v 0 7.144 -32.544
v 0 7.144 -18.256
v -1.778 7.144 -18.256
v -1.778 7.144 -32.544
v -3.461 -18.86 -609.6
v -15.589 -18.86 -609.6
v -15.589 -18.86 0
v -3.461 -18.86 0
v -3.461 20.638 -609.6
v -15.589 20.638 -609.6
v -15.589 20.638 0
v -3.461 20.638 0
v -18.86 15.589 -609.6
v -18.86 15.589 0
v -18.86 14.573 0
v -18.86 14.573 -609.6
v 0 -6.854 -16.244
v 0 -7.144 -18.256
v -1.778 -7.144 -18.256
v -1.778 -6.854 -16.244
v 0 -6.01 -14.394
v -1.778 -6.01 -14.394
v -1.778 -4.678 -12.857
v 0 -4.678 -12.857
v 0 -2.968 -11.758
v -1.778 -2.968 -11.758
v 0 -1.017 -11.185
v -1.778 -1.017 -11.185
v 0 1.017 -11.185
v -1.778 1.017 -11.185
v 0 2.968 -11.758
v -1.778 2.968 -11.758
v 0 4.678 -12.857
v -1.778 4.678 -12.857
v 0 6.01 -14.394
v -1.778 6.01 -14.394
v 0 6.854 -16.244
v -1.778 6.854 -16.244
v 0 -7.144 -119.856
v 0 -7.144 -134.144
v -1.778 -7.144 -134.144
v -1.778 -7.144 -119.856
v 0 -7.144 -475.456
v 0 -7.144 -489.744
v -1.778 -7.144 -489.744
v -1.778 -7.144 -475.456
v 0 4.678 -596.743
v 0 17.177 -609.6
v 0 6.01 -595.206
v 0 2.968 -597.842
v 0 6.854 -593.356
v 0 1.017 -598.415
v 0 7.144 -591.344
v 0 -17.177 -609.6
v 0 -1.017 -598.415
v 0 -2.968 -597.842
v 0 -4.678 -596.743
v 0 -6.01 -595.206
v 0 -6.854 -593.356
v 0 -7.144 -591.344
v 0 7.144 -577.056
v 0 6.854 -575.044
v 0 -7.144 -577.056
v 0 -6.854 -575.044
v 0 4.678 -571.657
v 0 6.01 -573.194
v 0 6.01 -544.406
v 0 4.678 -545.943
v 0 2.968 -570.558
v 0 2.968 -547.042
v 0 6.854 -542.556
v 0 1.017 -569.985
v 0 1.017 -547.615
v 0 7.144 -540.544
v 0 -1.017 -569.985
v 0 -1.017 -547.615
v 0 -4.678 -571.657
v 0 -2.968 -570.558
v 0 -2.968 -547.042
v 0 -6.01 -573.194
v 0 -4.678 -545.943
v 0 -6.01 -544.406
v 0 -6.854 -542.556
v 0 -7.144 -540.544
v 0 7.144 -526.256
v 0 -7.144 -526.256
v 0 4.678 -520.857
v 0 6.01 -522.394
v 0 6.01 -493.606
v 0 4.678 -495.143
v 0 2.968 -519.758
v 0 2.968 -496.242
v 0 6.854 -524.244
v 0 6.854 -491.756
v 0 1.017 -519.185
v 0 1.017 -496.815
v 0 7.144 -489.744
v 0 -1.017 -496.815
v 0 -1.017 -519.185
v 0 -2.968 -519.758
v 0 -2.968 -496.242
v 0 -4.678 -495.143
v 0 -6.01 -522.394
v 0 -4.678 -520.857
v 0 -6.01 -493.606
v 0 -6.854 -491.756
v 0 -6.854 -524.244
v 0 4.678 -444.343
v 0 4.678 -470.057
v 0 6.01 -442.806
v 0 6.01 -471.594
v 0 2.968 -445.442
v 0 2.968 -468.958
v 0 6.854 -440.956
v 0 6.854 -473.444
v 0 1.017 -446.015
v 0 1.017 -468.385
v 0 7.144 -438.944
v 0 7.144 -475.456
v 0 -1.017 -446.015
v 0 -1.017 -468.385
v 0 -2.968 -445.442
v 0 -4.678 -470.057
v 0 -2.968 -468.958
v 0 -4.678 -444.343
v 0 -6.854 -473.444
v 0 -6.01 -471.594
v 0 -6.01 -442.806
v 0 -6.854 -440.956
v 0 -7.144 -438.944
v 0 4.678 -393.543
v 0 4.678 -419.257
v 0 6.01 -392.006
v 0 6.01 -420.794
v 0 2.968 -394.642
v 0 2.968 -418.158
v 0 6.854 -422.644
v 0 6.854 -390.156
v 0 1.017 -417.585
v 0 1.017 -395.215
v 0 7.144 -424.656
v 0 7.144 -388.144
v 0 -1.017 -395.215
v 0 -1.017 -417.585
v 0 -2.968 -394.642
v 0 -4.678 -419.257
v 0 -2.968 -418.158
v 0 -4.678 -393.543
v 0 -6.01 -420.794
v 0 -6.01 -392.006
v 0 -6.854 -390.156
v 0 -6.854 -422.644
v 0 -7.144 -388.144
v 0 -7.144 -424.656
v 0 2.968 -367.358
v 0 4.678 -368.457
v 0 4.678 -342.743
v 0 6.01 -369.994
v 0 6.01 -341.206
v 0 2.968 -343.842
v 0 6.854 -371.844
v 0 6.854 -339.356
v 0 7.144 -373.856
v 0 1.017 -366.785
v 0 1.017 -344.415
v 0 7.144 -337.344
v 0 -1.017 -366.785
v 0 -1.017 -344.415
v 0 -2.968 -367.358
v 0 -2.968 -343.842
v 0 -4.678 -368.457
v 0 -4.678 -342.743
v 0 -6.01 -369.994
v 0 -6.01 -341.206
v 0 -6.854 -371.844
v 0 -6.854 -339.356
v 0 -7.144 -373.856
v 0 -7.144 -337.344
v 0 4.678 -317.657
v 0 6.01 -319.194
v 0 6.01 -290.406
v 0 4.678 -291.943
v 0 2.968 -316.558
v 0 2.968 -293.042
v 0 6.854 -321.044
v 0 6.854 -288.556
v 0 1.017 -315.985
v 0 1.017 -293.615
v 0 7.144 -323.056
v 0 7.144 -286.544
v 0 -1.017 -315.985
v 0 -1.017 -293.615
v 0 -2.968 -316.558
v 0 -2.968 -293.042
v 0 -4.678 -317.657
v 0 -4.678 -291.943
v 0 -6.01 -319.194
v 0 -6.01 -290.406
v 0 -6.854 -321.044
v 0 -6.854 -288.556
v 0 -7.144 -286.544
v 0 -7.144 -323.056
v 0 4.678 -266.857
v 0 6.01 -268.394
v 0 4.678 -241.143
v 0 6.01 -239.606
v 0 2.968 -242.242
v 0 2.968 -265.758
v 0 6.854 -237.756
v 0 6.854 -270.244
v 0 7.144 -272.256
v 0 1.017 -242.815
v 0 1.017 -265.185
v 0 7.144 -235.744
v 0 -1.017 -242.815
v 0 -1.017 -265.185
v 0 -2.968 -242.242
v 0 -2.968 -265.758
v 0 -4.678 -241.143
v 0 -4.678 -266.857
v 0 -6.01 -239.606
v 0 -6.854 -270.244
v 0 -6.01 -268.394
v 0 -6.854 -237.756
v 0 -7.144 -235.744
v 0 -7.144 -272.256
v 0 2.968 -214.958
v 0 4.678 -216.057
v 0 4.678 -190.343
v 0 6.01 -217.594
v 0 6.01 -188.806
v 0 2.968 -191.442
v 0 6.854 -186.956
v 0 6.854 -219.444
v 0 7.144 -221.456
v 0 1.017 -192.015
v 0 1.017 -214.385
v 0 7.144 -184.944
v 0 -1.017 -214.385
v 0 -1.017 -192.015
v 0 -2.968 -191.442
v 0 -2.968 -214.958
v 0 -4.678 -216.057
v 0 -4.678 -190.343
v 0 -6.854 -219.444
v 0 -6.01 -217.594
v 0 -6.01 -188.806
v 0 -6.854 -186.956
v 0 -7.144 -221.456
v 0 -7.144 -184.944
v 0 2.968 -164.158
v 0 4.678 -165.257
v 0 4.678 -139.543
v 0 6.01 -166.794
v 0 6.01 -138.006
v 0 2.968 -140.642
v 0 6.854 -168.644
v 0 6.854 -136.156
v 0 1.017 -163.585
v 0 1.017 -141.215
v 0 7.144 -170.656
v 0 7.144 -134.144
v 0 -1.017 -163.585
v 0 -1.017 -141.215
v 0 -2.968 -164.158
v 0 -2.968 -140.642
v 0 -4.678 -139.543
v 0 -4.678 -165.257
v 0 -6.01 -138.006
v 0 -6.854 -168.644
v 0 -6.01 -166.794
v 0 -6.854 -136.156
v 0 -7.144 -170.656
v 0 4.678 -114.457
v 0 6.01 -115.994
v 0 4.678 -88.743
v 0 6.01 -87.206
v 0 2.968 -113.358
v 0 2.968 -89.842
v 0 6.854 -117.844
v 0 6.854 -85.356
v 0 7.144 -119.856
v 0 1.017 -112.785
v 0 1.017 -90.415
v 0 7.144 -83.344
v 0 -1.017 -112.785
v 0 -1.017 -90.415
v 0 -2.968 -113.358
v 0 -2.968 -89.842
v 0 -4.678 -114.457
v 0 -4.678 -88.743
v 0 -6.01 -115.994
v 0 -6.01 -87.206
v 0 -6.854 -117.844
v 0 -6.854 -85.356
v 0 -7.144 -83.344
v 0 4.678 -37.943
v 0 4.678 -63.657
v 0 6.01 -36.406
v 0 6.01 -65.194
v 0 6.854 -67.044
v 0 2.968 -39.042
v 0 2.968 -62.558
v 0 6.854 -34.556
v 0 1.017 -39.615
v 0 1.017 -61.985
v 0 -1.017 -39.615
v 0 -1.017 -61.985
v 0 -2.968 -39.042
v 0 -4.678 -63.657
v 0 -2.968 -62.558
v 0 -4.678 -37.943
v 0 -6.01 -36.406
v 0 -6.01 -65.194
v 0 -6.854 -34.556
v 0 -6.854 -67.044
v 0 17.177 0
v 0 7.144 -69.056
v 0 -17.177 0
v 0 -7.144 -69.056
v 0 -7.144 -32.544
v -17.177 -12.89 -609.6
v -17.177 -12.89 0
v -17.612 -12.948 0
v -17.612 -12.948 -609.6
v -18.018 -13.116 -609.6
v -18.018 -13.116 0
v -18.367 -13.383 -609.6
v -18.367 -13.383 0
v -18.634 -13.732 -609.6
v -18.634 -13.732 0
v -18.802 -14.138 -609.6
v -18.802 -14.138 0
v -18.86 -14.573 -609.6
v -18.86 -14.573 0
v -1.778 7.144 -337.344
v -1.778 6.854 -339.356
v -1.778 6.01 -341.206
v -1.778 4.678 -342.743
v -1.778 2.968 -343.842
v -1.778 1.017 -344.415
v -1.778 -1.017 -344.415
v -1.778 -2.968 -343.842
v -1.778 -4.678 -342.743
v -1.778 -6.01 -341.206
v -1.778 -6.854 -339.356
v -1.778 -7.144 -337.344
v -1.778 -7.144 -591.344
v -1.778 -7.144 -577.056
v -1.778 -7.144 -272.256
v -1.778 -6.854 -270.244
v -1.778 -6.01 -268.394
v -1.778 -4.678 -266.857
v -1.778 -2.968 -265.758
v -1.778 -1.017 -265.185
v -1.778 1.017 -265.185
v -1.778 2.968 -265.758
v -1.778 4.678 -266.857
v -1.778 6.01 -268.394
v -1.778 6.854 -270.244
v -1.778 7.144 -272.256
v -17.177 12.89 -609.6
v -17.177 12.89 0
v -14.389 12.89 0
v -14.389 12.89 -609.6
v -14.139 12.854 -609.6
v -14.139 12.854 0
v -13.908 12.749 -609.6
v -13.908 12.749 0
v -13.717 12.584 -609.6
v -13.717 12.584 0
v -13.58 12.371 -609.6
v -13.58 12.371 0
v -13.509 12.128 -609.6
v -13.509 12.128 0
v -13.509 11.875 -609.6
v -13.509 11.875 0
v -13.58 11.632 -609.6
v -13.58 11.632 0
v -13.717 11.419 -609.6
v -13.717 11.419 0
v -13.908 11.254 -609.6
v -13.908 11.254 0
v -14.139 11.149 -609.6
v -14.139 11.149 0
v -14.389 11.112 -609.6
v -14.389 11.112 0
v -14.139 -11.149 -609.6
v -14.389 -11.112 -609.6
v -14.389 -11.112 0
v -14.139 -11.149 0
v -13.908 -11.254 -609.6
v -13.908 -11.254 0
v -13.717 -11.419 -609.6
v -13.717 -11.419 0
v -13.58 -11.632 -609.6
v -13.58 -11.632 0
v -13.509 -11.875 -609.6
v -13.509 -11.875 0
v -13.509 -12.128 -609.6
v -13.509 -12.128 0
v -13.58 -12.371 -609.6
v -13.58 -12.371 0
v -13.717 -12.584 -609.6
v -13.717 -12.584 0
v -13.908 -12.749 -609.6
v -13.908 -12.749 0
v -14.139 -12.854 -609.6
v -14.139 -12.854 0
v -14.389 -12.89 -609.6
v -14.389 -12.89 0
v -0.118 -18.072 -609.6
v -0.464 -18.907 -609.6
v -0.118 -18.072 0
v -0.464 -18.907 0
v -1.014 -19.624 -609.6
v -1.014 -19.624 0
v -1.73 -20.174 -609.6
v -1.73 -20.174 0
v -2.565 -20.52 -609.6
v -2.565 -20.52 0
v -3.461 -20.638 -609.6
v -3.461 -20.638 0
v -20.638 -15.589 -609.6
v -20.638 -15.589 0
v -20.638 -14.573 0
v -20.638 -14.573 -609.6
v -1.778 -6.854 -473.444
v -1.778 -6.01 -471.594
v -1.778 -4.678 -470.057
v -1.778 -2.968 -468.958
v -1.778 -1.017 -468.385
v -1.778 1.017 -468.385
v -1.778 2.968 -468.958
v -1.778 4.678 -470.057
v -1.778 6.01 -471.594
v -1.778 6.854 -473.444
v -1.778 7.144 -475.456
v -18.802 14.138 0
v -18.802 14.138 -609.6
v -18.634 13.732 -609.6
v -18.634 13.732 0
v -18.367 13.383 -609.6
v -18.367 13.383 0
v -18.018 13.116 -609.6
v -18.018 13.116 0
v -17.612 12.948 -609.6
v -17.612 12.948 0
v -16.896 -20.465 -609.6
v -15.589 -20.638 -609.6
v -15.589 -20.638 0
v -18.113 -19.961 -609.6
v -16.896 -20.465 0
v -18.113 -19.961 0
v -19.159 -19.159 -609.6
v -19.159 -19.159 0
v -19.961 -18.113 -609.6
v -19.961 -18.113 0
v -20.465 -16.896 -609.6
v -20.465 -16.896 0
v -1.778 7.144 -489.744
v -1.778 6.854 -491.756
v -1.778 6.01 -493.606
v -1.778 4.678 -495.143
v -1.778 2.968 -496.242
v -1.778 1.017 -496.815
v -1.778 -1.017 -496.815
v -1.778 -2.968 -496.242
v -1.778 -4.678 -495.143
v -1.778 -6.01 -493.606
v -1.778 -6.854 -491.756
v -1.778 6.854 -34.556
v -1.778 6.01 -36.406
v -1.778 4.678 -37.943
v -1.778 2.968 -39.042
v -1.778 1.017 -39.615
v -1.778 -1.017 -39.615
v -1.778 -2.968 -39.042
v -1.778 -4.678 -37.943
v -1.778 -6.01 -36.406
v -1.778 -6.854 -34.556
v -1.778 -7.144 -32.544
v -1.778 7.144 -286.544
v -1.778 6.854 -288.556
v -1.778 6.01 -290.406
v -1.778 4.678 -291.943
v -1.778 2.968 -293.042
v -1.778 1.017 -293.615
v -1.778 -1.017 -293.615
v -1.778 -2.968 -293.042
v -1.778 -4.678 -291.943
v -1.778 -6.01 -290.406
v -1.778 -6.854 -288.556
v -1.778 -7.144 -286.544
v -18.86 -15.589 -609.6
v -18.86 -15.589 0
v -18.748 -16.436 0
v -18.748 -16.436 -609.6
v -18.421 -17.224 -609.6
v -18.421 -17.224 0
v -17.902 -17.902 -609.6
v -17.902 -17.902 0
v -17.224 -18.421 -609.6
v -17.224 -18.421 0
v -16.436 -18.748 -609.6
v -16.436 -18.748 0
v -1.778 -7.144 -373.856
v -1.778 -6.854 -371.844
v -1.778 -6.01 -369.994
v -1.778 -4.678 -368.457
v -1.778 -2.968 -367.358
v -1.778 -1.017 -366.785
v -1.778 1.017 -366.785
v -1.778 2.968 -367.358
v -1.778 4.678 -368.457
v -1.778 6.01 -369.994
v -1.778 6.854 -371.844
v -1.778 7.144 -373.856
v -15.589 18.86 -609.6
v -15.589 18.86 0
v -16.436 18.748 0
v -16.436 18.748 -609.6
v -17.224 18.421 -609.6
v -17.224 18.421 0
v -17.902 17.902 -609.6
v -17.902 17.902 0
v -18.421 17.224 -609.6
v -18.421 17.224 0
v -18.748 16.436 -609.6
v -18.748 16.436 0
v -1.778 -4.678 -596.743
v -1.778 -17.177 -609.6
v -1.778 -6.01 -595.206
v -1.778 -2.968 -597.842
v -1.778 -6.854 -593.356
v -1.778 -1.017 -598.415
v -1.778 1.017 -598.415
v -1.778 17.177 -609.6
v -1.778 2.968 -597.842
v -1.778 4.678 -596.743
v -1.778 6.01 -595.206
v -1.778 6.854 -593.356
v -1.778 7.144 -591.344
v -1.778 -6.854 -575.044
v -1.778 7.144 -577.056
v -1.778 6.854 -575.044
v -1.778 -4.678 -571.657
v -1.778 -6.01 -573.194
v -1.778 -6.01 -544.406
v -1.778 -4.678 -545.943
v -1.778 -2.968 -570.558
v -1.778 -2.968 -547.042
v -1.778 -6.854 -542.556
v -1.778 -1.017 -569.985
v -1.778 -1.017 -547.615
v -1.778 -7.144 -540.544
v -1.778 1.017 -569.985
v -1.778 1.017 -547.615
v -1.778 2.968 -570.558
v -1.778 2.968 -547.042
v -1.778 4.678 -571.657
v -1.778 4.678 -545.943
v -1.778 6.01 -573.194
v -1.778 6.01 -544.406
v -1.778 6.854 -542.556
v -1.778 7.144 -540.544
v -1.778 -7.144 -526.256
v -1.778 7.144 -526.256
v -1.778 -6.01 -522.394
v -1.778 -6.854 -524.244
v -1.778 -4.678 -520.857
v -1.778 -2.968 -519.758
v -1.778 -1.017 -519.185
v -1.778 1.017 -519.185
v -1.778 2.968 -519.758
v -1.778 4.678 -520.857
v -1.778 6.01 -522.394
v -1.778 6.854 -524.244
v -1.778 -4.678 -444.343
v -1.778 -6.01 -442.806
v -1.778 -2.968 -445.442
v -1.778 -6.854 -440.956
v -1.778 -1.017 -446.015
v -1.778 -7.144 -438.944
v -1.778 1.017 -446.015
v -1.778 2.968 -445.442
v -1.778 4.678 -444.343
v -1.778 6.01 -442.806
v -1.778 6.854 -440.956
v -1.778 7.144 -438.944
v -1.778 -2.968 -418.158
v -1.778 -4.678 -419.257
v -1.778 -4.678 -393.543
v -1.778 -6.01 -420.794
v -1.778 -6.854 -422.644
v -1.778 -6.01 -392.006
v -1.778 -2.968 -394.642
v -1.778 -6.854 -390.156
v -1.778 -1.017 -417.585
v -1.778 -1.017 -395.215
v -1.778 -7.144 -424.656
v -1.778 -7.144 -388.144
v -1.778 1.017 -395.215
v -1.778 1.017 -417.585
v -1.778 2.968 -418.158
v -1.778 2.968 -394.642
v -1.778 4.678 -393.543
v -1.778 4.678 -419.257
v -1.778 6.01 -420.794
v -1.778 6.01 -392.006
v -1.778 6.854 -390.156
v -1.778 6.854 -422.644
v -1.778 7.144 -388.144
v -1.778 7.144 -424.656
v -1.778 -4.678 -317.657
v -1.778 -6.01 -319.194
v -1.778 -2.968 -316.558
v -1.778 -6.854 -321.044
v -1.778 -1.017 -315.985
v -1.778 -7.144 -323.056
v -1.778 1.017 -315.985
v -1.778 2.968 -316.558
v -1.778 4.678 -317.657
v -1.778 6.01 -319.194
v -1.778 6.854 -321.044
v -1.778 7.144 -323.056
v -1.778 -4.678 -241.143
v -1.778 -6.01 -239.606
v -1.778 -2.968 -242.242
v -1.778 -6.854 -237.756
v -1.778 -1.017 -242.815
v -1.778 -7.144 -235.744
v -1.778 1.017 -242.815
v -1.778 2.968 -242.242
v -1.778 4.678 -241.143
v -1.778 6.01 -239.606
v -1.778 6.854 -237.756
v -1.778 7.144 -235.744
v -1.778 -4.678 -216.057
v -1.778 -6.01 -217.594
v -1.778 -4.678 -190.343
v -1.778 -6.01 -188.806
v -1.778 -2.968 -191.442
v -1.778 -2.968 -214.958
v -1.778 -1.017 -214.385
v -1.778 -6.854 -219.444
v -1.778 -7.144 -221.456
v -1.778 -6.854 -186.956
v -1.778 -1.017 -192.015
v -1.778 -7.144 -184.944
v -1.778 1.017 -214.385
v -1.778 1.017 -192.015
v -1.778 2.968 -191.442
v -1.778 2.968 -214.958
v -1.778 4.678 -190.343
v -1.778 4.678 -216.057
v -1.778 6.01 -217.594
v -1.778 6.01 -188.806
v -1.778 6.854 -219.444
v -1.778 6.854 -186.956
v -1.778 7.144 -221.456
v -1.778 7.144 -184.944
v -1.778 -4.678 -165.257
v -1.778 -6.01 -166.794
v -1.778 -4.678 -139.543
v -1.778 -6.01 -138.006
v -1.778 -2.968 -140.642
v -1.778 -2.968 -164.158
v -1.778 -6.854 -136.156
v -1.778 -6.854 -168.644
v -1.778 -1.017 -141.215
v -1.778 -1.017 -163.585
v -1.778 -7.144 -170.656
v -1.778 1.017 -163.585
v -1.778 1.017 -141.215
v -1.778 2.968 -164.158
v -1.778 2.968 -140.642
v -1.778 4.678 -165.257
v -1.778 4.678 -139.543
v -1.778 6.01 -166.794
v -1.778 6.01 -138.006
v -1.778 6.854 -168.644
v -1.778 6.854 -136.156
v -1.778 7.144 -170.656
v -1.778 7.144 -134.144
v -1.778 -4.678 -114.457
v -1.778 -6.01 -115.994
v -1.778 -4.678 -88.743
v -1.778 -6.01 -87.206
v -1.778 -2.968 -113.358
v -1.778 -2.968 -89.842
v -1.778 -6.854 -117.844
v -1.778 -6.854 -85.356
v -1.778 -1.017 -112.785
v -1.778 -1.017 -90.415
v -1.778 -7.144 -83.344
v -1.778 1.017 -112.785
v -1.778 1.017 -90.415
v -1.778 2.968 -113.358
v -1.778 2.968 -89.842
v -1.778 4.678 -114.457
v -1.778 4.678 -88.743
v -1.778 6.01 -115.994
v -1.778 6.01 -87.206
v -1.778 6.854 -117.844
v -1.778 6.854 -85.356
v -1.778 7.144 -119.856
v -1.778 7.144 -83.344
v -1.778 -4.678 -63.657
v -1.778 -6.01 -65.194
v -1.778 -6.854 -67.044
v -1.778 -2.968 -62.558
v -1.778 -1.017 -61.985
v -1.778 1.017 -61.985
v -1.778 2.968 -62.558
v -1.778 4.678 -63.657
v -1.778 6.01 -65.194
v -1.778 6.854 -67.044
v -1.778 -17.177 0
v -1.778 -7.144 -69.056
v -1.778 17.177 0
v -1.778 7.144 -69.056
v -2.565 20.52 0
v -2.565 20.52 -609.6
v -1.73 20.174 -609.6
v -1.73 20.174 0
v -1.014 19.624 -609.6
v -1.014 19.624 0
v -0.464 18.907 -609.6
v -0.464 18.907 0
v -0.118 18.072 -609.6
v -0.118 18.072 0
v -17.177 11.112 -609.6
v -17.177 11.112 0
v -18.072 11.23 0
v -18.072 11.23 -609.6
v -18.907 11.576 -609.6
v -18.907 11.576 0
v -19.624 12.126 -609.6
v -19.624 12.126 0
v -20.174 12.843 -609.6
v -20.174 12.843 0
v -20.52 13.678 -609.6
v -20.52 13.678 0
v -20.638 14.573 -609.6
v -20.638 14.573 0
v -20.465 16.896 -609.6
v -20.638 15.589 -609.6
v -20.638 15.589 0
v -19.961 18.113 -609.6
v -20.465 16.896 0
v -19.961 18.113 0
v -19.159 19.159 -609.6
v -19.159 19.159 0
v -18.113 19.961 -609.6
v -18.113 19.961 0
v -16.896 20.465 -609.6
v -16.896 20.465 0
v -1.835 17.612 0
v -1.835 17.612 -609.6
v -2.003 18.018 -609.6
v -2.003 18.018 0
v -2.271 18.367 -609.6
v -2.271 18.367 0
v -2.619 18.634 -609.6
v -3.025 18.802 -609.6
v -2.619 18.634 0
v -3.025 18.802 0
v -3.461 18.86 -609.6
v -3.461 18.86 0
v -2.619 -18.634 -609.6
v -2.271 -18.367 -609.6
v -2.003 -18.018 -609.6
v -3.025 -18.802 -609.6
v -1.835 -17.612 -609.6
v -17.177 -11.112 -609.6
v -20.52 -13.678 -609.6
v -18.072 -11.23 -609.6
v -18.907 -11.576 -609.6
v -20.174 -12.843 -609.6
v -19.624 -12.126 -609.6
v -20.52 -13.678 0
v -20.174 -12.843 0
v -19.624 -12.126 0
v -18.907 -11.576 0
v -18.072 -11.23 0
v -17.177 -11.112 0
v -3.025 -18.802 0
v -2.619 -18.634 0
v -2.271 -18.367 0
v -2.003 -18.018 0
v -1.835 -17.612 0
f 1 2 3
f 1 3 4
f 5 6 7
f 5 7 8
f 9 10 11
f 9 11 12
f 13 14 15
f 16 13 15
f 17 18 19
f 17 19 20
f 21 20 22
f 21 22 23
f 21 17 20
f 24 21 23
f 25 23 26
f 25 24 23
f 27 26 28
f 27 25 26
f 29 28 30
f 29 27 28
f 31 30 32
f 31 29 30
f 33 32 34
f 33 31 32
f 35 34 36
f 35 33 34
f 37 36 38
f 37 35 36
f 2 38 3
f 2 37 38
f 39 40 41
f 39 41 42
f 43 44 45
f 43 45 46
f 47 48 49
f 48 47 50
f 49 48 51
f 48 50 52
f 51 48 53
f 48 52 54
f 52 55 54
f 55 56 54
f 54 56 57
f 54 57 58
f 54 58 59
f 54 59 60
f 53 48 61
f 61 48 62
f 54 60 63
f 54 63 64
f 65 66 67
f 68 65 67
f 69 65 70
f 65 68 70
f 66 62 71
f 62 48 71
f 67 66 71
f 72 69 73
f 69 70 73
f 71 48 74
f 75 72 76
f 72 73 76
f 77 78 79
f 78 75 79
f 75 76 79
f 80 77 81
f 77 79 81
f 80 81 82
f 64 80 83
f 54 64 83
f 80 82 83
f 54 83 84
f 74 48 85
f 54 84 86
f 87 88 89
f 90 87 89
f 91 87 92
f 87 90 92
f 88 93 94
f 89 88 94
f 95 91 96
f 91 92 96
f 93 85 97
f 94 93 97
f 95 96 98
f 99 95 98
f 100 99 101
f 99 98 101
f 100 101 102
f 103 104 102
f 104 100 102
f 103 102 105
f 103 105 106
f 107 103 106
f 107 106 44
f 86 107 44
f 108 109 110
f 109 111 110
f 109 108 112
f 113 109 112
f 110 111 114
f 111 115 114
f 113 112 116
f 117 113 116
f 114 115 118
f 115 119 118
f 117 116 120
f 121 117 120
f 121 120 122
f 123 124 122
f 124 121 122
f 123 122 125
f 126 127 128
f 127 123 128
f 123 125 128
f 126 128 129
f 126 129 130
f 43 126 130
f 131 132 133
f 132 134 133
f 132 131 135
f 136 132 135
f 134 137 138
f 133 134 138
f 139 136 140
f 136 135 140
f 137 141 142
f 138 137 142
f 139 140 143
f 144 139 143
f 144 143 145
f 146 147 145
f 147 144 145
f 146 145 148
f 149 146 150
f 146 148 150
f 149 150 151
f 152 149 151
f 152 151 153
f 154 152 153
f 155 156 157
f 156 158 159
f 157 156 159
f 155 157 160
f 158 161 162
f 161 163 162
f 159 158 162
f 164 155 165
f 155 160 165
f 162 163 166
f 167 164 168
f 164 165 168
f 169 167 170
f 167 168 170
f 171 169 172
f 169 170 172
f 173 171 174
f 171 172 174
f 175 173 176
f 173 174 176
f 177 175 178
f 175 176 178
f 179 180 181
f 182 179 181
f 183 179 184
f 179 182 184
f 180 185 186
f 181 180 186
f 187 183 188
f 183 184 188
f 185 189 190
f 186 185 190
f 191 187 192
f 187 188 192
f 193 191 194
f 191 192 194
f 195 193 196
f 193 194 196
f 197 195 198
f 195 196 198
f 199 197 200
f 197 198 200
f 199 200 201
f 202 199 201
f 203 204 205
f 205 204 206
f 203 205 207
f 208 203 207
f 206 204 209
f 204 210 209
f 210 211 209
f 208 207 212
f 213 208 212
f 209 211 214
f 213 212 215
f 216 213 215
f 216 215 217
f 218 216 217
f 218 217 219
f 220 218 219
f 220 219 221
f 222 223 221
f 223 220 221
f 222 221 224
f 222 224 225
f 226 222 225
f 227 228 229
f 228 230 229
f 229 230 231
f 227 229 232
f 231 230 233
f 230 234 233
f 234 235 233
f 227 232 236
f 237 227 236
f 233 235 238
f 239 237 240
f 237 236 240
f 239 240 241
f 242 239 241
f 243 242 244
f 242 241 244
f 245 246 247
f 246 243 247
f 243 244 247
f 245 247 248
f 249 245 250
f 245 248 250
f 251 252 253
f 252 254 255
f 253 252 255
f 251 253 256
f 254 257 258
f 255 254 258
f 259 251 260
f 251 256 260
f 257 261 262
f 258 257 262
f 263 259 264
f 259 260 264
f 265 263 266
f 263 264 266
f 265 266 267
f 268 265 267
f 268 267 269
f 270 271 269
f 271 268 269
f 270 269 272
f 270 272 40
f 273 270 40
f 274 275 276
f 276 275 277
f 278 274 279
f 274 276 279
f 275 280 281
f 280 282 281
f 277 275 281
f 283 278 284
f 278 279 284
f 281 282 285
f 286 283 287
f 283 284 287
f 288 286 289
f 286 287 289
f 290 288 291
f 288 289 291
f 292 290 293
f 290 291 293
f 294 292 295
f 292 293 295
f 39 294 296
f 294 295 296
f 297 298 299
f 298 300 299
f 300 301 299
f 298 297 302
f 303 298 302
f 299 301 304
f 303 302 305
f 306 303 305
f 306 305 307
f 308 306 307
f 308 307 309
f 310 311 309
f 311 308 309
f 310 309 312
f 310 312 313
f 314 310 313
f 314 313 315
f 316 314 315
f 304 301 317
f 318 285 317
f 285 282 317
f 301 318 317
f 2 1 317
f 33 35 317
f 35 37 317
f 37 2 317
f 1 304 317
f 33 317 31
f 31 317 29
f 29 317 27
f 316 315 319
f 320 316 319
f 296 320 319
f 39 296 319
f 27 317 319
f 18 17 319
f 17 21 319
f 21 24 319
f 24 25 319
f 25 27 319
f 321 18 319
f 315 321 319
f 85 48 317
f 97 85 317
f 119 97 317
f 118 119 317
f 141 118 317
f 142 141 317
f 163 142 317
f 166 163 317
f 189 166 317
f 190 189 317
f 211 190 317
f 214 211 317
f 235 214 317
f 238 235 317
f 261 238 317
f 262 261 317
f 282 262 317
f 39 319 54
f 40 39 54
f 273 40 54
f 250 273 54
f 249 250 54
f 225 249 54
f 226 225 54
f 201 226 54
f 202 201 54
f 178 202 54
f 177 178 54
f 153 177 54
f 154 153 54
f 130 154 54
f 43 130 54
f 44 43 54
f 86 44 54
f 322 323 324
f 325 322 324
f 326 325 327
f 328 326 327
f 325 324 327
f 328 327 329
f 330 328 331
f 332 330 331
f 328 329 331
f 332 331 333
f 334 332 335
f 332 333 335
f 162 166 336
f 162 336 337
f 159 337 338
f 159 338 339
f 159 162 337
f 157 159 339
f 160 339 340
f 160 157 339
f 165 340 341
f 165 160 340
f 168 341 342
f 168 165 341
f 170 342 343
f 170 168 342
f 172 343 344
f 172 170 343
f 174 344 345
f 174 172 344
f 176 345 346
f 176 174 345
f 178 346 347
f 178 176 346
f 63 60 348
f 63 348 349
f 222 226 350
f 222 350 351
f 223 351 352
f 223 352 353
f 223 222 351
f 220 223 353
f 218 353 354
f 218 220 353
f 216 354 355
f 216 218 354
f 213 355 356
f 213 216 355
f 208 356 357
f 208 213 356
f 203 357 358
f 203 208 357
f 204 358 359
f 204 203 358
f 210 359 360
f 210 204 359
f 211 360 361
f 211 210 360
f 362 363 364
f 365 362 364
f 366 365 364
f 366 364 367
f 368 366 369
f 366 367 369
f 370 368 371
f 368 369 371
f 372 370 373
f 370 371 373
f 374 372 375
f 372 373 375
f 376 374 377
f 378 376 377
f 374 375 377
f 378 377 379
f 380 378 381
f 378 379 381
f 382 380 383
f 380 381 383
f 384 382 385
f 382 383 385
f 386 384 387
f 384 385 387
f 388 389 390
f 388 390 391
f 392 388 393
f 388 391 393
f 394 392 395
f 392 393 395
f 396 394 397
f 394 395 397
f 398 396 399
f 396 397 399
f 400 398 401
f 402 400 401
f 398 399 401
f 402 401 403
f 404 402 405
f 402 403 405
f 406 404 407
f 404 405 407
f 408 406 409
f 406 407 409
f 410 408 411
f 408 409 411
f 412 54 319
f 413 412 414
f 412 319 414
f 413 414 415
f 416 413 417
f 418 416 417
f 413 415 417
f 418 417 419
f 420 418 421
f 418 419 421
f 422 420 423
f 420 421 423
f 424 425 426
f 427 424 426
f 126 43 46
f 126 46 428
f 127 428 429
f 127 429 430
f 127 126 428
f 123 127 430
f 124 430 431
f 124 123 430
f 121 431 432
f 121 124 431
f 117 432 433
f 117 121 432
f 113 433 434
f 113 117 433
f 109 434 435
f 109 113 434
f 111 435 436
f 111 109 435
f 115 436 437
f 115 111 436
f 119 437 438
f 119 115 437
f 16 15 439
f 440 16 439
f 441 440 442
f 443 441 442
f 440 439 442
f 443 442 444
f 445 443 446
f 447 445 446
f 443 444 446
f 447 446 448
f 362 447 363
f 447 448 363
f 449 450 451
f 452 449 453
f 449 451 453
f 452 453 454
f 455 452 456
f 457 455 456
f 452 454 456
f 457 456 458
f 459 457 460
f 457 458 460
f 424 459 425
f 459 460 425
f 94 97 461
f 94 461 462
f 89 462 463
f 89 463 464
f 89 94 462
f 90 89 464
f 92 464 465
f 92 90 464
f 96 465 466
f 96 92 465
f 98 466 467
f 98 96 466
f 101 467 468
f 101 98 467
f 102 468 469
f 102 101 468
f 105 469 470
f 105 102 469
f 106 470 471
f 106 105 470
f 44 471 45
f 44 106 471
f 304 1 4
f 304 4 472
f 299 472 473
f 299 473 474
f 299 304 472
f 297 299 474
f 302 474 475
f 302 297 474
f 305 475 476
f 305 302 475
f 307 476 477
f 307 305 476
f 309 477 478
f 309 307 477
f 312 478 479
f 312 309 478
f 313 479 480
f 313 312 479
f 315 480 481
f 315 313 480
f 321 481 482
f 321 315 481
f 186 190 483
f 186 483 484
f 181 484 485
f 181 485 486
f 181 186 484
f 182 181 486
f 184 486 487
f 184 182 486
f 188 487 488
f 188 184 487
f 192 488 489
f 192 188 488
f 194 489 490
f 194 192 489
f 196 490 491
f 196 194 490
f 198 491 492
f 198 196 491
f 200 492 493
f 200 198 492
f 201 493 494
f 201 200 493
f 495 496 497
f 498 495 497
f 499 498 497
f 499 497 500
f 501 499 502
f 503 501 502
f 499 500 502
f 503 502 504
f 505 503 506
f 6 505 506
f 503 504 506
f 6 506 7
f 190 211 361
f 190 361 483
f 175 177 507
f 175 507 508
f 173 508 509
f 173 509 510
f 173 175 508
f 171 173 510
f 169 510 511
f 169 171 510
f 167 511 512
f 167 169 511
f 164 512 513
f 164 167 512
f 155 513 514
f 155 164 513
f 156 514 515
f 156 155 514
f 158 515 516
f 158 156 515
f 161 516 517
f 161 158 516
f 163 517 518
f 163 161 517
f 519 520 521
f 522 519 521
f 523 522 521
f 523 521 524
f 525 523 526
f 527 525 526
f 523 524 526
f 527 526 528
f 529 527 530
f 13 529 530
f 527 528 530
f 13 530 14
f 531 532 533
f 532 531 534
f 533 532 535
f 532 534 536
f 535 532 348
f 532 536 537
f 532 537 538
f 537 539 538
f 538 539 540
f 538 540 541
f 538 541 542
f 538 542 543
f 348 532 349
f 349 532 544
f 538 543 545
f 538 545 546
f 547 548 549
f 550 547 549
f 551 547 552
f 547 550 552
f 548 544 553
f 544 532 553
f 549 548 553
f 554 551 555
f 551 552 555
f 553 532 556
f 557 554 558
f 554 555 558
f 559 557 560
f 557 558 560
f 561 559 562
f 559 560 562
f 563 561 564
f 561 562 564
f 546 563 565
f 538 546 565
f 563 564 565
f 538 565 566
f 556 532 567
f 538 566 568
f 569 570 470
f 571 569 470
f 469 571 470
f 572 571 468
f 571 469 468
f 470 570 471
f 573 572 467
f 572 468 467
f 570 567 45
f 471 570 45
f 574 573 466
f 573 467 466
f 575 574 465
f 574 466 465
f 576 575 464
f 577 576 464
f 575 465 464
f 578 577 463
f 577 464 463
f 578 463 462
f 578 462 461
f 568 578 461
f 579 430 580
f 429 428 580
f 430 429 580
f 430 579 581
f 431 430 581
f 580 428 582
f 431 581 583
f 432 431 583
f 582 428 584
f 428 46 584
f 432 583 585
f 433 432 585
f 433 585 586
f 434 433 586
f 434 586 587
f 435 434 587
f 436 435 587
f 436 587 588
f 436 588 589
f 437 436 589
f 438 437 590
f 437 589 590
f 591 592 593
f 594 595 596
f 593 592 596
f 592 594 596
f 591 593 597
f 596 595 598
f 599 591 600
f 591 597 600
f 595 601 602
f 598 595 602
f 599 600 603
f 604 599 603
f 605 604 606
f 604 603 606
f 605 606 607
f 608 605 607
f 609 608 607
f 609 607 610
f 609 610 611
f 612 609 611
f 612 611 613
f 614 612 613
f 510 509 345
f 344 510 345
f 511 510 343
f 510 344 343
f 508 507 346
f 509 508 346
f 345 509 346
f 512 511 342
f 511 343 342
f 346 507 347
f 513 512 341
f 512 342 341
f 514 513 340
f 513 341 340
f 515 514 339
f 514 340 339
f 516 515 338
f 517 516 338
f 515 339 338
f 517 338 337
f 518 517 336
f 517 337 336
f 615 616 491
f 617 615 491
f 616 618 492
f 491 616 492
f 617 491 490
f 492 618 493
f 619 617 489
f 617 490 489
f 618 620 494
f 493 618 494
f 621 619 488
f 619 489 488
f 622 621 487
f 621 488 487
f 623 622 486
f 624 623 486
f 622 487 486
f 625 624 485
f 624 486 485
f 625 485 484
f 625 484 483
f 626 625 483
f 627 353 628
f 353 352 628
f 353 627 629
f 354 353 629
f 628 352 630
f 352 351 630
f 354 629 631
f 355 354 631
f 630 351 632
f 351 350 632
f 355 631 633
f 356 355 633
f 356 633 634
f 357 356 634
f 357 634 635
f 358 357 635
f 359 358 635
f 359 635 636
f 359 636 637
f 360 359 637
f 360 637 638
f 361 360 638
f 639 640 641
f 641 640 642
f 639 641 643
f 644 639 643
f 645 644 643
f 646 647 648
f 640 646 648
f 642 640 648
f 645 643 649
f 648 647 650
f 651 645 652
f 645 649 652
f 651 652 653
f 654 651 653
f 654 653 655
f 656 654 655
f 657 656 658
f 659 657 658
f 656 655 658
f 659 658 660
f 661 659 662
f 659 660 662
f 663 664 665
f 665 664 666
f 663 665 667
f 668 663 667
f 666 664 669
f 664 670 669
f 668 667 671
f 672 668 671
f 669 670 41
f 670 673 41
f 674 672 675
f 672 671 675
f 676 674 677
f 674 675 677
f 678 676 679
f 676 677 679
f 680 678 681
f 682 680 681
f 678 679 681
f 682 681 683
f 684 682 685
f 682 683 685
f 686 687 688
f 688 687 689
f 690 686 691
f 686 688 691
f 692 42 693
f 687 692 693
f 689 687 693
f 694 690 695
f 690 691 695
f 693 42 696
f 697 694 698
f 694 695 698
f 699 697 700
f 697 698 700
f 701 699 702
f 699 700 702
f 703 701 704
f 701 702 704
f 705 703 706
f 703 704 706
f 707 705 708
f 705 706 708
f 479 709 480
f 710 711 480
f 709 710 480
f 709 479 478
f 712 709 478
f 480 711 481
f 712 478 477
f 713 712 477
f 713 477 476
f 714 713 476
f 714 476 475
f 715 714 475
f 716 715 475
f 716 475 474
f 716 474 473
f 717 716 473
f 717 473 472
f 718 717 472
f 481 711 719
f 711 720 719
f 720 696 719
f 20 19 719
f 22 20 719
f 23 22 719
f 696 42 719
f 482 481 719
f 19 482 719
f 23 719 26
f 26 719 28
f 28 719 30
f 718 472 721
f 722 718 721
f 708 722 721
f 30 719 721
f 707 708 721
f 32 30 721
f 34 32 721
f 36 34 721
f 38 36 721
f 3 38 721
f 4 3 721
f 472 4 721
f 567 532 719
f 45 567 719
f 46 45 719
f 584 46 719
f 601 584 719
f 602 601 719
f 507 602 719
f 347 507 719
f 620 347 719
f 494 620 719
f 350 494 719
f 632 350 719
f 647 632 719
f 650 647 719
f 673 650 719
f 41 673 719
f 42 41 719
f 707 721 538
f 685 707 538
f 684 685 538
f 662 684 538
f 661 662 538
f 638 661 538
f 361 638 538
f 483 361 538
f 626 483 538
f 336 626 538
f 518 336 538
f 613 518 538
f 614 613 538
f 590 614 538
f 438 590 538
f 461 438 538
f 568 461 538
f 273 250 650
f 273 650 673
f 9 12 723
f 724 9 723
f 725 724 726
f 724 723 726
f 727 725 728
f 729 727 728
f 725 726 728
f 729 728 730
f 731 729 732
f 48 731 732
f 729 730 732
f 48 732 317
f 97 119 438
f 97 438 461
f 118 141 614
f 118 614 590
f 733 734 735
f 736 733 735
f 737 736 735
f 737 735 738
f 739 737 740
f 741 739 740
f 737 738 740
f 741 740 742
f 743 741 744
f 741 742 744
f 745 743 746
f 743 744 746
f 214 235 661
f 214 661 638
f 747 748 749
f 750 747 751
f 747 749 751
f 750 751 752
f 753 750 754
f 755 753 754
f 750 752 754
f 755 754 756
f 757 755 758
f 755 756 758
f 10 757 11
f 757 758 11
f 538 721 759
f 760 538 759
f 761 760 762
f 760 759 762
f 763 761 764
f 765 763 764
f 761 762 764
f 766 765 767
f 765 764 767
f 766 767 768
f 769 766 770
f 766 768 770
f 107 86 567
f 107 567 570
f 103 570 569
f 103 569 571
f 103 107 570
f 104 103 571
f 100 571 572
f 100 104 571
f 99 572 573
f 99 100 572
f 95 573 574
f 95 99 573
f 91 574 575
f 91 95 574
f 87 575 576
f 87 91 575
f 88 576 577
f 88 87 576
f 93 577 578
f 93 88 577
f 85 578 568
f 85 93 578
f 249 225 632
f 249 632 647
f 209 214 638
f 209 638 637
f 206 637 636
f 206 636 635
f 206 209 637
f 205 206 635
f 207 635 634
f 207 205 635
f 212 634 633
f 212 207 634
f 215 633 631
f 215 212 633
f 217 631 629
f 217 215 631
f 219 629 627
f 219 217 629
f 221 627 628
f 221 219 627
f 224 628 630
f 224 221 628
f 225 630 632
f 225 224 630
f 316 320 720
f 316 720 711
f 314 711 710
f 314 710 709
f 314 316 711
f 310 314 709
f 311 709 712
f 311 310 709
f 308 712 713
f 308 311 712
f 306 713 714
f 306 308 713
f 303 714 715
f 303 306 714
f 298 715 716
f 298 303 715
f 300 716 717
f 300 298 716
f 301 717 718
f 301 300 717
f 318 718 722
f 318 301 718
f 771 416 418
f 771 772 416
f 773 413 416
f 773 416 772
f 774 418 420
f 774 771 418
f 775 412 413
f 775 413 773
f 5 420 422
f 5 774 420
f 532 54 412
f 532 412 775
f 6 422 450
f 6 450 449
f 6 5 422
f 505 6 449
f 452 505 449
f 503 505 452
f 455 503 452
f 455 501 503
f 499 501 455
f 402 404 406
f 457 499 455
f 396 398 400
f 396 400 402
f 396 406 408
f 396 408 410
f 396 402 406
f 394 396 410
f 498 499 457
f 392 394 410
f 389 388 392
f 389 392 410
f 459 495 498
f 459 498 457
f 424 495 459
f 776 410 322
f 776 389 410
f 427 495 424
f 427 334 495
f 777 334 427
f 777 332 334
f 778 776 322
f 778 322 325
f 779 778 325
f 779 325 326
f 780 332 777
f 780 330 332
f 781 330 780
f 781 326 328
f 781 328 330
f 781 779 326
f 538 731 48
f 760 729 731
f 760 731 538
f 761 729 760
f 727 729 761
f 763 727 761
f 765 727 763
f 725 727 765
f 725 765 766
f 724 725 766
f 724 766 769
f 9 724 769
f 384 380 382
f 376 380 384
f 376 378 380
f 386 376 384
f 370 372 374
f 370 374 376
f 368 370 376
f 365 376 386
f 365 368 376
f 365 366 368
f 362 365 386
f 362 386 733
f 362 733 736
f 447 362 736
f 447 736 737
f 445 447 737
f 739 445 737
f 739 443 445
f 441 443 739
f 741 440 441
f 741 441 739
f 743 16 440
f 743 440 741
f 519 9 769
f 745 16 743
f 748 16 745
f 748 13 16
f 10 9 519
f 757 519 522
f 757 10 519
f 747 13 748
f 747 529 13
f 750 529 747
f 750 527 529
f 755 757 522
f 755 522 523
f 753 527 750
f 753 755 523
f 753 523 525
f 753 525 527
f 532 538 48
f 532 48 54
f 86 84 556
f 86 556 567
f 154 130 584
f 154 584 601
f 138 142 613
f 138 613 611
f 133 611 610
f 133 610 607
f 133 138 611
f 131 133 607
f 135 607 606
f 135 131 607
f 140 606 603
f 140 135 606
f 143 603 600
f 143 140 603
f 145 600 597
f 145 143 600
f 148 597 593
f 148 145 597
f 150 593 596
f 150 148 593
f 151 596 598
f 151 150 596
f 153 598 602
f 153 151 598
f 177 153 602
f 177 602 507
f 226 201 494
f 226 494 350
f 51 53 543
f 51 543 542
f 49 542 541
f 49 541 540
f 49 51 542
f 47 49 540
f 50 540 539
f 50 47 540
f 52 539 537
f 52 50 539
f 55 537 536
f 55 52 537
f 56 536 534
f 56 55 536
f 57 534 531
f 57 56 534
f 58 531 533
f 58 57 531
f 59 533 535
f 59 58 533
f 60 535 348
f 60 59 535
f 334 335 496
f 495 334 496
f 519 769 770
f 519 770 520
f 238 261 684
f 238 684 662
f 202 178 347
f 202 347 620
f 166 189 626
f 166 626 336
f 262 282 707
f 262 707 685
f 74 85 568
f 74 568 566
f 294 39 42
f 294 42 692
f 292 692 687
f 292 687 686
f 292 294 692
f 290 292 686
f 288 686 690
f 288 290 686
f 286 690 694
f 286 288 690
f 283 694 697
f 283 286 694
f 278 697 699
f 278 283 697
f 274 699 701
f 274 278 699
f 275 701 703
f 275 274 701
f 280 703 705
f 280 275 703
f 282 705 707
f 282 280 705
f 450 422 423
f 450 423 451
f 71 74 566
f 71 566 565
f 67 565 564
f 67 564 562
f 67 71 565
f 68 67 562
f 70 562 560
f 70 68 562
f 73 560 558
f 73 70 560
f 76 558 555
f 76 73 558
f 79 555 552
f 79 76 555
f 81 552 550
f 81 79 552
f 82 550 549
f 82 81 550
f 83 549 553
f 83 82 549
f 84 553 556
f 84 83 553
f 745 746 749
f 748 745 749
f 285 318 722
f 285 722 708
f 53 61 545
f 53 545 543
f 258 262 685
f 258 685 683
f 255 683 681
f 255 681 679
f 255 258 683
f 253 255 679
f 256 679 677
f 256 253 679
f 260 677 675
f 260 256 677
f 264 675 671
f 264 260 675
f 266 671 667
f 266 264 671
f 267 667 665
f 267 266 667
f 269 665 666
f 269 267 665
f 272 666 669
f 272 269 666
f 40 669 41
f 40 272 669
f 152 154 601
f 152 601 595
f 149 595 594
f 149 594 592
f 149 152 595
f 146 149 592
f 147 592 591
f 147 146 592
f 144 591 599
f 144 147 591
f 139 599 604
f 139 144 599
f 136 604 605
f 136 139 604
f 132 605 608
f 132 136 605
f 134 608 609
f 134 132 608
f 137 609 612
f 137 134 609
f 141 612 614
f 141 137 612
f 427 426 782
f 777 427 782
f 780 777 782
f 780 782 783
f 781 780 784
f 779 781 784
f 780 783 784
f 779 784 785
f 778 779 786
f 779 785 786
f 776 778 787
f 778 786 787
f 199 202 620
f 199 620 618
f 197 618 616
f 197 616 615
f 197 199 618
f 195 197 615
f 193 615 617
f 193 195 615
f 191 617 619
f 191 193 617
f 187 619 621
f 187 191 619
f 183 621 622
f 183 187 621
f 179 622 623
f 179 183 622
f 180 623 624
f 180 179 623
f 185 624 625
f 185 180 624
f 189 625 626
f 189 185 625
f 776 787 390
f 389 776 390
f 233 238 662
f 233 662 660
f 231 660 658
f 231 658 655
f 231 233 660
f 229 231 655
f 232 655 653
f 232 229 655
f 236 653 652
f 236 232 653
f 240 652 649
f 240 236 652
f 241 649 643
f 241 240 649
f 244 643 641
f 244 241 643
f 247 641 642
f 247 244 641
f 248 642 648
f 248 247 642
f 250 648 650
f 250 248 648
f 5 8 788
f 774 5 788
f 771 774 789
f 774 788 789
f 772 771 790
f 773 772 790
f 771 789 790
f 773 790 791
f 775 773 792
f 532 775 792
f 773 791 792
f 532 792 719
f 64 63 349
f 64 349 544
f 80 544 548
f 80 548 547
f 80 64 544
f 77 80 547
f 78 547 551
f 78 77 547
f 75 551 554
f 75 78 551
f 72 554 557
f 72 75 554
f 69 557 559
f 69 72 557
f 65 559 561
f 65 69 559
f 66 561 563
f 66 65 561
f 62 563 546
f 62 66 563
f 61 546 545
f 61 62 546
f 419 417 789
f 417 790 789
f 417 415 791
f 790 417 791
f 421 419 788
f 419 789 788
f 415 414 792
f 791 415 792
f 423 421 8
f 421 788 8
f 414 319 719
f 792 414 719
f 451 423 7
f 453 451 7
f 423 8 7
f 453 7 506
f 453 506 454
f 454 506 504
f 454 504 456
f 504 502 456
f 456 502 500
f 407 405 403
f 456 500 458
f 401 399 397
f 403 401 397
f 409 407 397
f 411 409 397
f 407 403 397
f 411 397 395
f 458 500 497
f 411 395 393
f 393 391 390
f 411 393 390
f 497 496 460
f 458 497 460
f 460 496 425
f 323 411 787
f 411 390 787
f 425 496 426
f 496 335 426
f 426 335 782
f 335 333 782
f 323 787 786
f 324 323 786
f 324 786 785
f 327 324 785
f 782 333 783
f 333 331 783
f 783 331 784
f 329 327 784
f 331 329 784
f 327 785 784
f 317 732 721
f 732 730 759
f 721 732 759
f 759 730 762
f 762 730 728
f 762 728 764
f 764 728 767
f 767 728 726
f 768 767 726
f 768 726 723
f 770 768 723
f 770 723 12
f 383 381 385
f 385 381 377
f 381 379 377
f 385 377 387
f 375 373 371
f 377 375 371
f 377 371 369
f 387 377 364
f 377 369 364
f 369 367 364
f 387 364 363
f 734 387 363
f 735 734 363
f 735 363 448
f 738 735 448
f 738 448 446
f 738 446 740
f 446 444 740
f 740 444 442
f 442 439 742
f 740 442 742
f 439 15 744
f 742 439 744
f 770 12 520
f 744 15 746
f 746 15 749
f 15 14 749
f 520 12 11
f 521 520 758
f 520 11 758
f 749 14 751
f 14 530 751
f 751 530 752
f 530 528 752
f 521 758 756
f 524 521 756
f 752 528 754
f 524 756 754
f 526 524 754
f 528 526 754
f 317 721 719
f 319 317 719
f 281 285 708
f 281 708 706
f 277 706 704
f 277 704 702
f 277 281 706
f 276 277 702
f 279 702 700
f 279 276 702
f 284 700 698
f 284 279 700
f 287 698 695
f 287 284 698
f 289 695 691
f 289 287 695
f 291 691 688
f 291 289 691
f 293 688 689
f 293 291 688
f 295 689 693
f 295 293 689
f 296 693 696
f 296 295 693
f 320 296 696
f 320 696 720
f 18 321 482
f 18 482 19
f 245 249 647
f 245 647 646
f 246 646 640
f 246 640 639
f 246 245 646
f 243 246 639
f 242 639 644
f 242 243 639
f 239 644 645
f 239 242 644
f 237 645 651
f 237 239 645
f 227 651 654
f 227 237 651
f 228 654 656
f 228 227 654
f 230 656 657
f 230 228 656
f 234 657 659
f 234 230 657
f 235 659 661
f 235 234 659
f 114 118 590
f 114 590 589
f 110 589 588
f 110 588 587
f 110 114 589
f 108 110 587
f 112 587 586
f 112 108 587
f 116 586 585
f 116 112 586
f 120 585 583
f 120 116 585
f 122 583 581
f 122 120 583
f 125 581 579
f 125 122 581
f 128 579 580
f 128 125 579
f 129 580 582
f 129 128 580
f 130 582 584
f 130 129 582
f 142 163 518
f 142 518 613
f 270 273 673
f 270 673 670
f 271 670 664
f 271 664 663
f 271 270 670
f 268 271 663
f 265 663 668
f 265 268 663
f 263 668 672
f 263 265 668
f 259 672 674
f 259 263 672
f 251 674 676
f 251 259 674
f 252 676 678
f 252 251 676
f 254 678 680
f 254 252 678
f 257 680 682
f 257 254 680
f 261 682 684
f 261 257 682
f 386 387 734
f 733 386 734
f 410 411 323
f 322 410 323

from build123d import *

# Parameters (mm, degrees)
BOSS_EXTRUDE1_DEPTH = 609.6
CUT_EXTRUDE1_DEPTH  = 1.778
LPATTERN1_COUNT     = 12
LPATTERN1_PITCH     = 50.8


with BuildPart() as part:
    # Sketch1 → Boss-Extrude1 (new body)
    with BuildSketch(Plane.XY):
        with BuildLine():
            Line((-15.58925, 20.6375), (-3.46075, 20.6375))
            ThreePointArc((-3.46075, 20.6375), (-1.013630207, 19.623869793), (0, 17.17675))
            Line((0, 17.17675), (0, -17.17675))
            ThreePointArc((0, -17.17675), (-1.013630207, -19.623869793), (-3.46075, -20.6375))
            Line((-3.46075, -20.6375), (-15.58925, -20.6375))
            ThreePointArc((-15.58925, -20.6375), (-19.158901808, -19.158901808), (-20.6375, -15.58925))
            Line((-20.6375, -15.58925), (-20.6375, -14.57325))
            ThreePointArc((-20.6375, -14.57325), (-19.623869793, -12.126130207), (-17.17675, -11.1125))
            Line((-17.17675, -11.1125), (-14.3891, -11.1125))
            ThreePointArc((-14.3891, -11.1125), (-13.5001, -12.0015), (-14.3891, -12.8905))
            Line((-14.3891, -12.8905), (-17.17675, -12.8905))
            ThreePointArc((-17.17675, -12.8905), (-18.366633936, -13.383366064), (-18.8595, -14.57325))
            Line((-18.8595, -14.57325), (-18.8595, -15.58925))
            ThreePointArc((-18.8595, -15.58925), (-17.901665951, -17.901665951), (-15.58925, -18.8595))
            Line((-15.58925, -18.8595), (-3.46075, -18.8595))
            ThreePointArc((-3.46075, -18.8595), (-2.270866064, -18.366633936), (-1.778, -17.17675))
            Line((-1.778, -17.17675), (-1.778, 17.17675))
            ThreePointArc((-1.778, 17.17675), (-2.270866064, 18.366633936), (-3.46075, 18.8595))
            Line((-3.46075, 18.8595), (-15.58925, 18.8595))
            ThreePointArc((-15.58925, 18.8595), (-17.901665951, 17.901665951), (-18.8595, 15.58925))
            Line((-18.8595, 15.58925), (-18.8595, 14.57325))
            ThreePointArc((-18.8595, 14.57325), (-18.366633936, 13.383366064), (-17.17675, 12.8905))
            Line((-17.17675, 12.8905), (-14.3891, 12.8905))
            ThreePointArc((-14.3891, 12.8905), (-13.5001, 12.0015), (-14.3891, 11.1125))
            Line((-14.3891, 11.1125), (-17.17675, 11.1125))
            ThreePointArc((-17.17675, 11.1125), (-19.623869793, 12.126130207), (-20.6375, 14.57325))
            Line((-20.6375, 14.57325), (-20.6375, 15.58925))
            ThreePointArc((-20.6375, 15.58925), (-19.158901808, 19.158901808), (-15.58925, 20.6375))
        make_face()
    extrude(amount=-BOSS_EXTRUDE1_DEPTH)

    # Sketch2 → Cut-Extrude1 (cut)
    with BuildSketch(Plane(origin=(0, 0, 0), x_dir=(0, 0, -1), z_dir=(1, 0, 0))):
        with BuildLine():
            Line((18.25625, 7.14375), (32.54375, 7.14375))
            ThreePointArc((32.54375, 7.14375), (39.6875, 0), (32.54375, -7.14375))
            Line((32.54375, -7.14375), (18.25625, -7.14375))
            ThreePointArc((18.25625, -7.14375), (11.1125, 0), (18.25625, 7.14375))
        make_face()
    cut_extrude1 = extrude(amount=-CUT_EXTRUDE1_DEPTH, mode=Mode.SUBTRACT)

    # LPattern1: Cut-Extrude1 ×12
    with Locations(*[(0, 0, -i * LPATTERN1_PITCH) for i in range(1, LPATTERN1_COUNT)]):
        add(cut_extrude1, mode=Mode.SUBTRACT)


solid = part.part
